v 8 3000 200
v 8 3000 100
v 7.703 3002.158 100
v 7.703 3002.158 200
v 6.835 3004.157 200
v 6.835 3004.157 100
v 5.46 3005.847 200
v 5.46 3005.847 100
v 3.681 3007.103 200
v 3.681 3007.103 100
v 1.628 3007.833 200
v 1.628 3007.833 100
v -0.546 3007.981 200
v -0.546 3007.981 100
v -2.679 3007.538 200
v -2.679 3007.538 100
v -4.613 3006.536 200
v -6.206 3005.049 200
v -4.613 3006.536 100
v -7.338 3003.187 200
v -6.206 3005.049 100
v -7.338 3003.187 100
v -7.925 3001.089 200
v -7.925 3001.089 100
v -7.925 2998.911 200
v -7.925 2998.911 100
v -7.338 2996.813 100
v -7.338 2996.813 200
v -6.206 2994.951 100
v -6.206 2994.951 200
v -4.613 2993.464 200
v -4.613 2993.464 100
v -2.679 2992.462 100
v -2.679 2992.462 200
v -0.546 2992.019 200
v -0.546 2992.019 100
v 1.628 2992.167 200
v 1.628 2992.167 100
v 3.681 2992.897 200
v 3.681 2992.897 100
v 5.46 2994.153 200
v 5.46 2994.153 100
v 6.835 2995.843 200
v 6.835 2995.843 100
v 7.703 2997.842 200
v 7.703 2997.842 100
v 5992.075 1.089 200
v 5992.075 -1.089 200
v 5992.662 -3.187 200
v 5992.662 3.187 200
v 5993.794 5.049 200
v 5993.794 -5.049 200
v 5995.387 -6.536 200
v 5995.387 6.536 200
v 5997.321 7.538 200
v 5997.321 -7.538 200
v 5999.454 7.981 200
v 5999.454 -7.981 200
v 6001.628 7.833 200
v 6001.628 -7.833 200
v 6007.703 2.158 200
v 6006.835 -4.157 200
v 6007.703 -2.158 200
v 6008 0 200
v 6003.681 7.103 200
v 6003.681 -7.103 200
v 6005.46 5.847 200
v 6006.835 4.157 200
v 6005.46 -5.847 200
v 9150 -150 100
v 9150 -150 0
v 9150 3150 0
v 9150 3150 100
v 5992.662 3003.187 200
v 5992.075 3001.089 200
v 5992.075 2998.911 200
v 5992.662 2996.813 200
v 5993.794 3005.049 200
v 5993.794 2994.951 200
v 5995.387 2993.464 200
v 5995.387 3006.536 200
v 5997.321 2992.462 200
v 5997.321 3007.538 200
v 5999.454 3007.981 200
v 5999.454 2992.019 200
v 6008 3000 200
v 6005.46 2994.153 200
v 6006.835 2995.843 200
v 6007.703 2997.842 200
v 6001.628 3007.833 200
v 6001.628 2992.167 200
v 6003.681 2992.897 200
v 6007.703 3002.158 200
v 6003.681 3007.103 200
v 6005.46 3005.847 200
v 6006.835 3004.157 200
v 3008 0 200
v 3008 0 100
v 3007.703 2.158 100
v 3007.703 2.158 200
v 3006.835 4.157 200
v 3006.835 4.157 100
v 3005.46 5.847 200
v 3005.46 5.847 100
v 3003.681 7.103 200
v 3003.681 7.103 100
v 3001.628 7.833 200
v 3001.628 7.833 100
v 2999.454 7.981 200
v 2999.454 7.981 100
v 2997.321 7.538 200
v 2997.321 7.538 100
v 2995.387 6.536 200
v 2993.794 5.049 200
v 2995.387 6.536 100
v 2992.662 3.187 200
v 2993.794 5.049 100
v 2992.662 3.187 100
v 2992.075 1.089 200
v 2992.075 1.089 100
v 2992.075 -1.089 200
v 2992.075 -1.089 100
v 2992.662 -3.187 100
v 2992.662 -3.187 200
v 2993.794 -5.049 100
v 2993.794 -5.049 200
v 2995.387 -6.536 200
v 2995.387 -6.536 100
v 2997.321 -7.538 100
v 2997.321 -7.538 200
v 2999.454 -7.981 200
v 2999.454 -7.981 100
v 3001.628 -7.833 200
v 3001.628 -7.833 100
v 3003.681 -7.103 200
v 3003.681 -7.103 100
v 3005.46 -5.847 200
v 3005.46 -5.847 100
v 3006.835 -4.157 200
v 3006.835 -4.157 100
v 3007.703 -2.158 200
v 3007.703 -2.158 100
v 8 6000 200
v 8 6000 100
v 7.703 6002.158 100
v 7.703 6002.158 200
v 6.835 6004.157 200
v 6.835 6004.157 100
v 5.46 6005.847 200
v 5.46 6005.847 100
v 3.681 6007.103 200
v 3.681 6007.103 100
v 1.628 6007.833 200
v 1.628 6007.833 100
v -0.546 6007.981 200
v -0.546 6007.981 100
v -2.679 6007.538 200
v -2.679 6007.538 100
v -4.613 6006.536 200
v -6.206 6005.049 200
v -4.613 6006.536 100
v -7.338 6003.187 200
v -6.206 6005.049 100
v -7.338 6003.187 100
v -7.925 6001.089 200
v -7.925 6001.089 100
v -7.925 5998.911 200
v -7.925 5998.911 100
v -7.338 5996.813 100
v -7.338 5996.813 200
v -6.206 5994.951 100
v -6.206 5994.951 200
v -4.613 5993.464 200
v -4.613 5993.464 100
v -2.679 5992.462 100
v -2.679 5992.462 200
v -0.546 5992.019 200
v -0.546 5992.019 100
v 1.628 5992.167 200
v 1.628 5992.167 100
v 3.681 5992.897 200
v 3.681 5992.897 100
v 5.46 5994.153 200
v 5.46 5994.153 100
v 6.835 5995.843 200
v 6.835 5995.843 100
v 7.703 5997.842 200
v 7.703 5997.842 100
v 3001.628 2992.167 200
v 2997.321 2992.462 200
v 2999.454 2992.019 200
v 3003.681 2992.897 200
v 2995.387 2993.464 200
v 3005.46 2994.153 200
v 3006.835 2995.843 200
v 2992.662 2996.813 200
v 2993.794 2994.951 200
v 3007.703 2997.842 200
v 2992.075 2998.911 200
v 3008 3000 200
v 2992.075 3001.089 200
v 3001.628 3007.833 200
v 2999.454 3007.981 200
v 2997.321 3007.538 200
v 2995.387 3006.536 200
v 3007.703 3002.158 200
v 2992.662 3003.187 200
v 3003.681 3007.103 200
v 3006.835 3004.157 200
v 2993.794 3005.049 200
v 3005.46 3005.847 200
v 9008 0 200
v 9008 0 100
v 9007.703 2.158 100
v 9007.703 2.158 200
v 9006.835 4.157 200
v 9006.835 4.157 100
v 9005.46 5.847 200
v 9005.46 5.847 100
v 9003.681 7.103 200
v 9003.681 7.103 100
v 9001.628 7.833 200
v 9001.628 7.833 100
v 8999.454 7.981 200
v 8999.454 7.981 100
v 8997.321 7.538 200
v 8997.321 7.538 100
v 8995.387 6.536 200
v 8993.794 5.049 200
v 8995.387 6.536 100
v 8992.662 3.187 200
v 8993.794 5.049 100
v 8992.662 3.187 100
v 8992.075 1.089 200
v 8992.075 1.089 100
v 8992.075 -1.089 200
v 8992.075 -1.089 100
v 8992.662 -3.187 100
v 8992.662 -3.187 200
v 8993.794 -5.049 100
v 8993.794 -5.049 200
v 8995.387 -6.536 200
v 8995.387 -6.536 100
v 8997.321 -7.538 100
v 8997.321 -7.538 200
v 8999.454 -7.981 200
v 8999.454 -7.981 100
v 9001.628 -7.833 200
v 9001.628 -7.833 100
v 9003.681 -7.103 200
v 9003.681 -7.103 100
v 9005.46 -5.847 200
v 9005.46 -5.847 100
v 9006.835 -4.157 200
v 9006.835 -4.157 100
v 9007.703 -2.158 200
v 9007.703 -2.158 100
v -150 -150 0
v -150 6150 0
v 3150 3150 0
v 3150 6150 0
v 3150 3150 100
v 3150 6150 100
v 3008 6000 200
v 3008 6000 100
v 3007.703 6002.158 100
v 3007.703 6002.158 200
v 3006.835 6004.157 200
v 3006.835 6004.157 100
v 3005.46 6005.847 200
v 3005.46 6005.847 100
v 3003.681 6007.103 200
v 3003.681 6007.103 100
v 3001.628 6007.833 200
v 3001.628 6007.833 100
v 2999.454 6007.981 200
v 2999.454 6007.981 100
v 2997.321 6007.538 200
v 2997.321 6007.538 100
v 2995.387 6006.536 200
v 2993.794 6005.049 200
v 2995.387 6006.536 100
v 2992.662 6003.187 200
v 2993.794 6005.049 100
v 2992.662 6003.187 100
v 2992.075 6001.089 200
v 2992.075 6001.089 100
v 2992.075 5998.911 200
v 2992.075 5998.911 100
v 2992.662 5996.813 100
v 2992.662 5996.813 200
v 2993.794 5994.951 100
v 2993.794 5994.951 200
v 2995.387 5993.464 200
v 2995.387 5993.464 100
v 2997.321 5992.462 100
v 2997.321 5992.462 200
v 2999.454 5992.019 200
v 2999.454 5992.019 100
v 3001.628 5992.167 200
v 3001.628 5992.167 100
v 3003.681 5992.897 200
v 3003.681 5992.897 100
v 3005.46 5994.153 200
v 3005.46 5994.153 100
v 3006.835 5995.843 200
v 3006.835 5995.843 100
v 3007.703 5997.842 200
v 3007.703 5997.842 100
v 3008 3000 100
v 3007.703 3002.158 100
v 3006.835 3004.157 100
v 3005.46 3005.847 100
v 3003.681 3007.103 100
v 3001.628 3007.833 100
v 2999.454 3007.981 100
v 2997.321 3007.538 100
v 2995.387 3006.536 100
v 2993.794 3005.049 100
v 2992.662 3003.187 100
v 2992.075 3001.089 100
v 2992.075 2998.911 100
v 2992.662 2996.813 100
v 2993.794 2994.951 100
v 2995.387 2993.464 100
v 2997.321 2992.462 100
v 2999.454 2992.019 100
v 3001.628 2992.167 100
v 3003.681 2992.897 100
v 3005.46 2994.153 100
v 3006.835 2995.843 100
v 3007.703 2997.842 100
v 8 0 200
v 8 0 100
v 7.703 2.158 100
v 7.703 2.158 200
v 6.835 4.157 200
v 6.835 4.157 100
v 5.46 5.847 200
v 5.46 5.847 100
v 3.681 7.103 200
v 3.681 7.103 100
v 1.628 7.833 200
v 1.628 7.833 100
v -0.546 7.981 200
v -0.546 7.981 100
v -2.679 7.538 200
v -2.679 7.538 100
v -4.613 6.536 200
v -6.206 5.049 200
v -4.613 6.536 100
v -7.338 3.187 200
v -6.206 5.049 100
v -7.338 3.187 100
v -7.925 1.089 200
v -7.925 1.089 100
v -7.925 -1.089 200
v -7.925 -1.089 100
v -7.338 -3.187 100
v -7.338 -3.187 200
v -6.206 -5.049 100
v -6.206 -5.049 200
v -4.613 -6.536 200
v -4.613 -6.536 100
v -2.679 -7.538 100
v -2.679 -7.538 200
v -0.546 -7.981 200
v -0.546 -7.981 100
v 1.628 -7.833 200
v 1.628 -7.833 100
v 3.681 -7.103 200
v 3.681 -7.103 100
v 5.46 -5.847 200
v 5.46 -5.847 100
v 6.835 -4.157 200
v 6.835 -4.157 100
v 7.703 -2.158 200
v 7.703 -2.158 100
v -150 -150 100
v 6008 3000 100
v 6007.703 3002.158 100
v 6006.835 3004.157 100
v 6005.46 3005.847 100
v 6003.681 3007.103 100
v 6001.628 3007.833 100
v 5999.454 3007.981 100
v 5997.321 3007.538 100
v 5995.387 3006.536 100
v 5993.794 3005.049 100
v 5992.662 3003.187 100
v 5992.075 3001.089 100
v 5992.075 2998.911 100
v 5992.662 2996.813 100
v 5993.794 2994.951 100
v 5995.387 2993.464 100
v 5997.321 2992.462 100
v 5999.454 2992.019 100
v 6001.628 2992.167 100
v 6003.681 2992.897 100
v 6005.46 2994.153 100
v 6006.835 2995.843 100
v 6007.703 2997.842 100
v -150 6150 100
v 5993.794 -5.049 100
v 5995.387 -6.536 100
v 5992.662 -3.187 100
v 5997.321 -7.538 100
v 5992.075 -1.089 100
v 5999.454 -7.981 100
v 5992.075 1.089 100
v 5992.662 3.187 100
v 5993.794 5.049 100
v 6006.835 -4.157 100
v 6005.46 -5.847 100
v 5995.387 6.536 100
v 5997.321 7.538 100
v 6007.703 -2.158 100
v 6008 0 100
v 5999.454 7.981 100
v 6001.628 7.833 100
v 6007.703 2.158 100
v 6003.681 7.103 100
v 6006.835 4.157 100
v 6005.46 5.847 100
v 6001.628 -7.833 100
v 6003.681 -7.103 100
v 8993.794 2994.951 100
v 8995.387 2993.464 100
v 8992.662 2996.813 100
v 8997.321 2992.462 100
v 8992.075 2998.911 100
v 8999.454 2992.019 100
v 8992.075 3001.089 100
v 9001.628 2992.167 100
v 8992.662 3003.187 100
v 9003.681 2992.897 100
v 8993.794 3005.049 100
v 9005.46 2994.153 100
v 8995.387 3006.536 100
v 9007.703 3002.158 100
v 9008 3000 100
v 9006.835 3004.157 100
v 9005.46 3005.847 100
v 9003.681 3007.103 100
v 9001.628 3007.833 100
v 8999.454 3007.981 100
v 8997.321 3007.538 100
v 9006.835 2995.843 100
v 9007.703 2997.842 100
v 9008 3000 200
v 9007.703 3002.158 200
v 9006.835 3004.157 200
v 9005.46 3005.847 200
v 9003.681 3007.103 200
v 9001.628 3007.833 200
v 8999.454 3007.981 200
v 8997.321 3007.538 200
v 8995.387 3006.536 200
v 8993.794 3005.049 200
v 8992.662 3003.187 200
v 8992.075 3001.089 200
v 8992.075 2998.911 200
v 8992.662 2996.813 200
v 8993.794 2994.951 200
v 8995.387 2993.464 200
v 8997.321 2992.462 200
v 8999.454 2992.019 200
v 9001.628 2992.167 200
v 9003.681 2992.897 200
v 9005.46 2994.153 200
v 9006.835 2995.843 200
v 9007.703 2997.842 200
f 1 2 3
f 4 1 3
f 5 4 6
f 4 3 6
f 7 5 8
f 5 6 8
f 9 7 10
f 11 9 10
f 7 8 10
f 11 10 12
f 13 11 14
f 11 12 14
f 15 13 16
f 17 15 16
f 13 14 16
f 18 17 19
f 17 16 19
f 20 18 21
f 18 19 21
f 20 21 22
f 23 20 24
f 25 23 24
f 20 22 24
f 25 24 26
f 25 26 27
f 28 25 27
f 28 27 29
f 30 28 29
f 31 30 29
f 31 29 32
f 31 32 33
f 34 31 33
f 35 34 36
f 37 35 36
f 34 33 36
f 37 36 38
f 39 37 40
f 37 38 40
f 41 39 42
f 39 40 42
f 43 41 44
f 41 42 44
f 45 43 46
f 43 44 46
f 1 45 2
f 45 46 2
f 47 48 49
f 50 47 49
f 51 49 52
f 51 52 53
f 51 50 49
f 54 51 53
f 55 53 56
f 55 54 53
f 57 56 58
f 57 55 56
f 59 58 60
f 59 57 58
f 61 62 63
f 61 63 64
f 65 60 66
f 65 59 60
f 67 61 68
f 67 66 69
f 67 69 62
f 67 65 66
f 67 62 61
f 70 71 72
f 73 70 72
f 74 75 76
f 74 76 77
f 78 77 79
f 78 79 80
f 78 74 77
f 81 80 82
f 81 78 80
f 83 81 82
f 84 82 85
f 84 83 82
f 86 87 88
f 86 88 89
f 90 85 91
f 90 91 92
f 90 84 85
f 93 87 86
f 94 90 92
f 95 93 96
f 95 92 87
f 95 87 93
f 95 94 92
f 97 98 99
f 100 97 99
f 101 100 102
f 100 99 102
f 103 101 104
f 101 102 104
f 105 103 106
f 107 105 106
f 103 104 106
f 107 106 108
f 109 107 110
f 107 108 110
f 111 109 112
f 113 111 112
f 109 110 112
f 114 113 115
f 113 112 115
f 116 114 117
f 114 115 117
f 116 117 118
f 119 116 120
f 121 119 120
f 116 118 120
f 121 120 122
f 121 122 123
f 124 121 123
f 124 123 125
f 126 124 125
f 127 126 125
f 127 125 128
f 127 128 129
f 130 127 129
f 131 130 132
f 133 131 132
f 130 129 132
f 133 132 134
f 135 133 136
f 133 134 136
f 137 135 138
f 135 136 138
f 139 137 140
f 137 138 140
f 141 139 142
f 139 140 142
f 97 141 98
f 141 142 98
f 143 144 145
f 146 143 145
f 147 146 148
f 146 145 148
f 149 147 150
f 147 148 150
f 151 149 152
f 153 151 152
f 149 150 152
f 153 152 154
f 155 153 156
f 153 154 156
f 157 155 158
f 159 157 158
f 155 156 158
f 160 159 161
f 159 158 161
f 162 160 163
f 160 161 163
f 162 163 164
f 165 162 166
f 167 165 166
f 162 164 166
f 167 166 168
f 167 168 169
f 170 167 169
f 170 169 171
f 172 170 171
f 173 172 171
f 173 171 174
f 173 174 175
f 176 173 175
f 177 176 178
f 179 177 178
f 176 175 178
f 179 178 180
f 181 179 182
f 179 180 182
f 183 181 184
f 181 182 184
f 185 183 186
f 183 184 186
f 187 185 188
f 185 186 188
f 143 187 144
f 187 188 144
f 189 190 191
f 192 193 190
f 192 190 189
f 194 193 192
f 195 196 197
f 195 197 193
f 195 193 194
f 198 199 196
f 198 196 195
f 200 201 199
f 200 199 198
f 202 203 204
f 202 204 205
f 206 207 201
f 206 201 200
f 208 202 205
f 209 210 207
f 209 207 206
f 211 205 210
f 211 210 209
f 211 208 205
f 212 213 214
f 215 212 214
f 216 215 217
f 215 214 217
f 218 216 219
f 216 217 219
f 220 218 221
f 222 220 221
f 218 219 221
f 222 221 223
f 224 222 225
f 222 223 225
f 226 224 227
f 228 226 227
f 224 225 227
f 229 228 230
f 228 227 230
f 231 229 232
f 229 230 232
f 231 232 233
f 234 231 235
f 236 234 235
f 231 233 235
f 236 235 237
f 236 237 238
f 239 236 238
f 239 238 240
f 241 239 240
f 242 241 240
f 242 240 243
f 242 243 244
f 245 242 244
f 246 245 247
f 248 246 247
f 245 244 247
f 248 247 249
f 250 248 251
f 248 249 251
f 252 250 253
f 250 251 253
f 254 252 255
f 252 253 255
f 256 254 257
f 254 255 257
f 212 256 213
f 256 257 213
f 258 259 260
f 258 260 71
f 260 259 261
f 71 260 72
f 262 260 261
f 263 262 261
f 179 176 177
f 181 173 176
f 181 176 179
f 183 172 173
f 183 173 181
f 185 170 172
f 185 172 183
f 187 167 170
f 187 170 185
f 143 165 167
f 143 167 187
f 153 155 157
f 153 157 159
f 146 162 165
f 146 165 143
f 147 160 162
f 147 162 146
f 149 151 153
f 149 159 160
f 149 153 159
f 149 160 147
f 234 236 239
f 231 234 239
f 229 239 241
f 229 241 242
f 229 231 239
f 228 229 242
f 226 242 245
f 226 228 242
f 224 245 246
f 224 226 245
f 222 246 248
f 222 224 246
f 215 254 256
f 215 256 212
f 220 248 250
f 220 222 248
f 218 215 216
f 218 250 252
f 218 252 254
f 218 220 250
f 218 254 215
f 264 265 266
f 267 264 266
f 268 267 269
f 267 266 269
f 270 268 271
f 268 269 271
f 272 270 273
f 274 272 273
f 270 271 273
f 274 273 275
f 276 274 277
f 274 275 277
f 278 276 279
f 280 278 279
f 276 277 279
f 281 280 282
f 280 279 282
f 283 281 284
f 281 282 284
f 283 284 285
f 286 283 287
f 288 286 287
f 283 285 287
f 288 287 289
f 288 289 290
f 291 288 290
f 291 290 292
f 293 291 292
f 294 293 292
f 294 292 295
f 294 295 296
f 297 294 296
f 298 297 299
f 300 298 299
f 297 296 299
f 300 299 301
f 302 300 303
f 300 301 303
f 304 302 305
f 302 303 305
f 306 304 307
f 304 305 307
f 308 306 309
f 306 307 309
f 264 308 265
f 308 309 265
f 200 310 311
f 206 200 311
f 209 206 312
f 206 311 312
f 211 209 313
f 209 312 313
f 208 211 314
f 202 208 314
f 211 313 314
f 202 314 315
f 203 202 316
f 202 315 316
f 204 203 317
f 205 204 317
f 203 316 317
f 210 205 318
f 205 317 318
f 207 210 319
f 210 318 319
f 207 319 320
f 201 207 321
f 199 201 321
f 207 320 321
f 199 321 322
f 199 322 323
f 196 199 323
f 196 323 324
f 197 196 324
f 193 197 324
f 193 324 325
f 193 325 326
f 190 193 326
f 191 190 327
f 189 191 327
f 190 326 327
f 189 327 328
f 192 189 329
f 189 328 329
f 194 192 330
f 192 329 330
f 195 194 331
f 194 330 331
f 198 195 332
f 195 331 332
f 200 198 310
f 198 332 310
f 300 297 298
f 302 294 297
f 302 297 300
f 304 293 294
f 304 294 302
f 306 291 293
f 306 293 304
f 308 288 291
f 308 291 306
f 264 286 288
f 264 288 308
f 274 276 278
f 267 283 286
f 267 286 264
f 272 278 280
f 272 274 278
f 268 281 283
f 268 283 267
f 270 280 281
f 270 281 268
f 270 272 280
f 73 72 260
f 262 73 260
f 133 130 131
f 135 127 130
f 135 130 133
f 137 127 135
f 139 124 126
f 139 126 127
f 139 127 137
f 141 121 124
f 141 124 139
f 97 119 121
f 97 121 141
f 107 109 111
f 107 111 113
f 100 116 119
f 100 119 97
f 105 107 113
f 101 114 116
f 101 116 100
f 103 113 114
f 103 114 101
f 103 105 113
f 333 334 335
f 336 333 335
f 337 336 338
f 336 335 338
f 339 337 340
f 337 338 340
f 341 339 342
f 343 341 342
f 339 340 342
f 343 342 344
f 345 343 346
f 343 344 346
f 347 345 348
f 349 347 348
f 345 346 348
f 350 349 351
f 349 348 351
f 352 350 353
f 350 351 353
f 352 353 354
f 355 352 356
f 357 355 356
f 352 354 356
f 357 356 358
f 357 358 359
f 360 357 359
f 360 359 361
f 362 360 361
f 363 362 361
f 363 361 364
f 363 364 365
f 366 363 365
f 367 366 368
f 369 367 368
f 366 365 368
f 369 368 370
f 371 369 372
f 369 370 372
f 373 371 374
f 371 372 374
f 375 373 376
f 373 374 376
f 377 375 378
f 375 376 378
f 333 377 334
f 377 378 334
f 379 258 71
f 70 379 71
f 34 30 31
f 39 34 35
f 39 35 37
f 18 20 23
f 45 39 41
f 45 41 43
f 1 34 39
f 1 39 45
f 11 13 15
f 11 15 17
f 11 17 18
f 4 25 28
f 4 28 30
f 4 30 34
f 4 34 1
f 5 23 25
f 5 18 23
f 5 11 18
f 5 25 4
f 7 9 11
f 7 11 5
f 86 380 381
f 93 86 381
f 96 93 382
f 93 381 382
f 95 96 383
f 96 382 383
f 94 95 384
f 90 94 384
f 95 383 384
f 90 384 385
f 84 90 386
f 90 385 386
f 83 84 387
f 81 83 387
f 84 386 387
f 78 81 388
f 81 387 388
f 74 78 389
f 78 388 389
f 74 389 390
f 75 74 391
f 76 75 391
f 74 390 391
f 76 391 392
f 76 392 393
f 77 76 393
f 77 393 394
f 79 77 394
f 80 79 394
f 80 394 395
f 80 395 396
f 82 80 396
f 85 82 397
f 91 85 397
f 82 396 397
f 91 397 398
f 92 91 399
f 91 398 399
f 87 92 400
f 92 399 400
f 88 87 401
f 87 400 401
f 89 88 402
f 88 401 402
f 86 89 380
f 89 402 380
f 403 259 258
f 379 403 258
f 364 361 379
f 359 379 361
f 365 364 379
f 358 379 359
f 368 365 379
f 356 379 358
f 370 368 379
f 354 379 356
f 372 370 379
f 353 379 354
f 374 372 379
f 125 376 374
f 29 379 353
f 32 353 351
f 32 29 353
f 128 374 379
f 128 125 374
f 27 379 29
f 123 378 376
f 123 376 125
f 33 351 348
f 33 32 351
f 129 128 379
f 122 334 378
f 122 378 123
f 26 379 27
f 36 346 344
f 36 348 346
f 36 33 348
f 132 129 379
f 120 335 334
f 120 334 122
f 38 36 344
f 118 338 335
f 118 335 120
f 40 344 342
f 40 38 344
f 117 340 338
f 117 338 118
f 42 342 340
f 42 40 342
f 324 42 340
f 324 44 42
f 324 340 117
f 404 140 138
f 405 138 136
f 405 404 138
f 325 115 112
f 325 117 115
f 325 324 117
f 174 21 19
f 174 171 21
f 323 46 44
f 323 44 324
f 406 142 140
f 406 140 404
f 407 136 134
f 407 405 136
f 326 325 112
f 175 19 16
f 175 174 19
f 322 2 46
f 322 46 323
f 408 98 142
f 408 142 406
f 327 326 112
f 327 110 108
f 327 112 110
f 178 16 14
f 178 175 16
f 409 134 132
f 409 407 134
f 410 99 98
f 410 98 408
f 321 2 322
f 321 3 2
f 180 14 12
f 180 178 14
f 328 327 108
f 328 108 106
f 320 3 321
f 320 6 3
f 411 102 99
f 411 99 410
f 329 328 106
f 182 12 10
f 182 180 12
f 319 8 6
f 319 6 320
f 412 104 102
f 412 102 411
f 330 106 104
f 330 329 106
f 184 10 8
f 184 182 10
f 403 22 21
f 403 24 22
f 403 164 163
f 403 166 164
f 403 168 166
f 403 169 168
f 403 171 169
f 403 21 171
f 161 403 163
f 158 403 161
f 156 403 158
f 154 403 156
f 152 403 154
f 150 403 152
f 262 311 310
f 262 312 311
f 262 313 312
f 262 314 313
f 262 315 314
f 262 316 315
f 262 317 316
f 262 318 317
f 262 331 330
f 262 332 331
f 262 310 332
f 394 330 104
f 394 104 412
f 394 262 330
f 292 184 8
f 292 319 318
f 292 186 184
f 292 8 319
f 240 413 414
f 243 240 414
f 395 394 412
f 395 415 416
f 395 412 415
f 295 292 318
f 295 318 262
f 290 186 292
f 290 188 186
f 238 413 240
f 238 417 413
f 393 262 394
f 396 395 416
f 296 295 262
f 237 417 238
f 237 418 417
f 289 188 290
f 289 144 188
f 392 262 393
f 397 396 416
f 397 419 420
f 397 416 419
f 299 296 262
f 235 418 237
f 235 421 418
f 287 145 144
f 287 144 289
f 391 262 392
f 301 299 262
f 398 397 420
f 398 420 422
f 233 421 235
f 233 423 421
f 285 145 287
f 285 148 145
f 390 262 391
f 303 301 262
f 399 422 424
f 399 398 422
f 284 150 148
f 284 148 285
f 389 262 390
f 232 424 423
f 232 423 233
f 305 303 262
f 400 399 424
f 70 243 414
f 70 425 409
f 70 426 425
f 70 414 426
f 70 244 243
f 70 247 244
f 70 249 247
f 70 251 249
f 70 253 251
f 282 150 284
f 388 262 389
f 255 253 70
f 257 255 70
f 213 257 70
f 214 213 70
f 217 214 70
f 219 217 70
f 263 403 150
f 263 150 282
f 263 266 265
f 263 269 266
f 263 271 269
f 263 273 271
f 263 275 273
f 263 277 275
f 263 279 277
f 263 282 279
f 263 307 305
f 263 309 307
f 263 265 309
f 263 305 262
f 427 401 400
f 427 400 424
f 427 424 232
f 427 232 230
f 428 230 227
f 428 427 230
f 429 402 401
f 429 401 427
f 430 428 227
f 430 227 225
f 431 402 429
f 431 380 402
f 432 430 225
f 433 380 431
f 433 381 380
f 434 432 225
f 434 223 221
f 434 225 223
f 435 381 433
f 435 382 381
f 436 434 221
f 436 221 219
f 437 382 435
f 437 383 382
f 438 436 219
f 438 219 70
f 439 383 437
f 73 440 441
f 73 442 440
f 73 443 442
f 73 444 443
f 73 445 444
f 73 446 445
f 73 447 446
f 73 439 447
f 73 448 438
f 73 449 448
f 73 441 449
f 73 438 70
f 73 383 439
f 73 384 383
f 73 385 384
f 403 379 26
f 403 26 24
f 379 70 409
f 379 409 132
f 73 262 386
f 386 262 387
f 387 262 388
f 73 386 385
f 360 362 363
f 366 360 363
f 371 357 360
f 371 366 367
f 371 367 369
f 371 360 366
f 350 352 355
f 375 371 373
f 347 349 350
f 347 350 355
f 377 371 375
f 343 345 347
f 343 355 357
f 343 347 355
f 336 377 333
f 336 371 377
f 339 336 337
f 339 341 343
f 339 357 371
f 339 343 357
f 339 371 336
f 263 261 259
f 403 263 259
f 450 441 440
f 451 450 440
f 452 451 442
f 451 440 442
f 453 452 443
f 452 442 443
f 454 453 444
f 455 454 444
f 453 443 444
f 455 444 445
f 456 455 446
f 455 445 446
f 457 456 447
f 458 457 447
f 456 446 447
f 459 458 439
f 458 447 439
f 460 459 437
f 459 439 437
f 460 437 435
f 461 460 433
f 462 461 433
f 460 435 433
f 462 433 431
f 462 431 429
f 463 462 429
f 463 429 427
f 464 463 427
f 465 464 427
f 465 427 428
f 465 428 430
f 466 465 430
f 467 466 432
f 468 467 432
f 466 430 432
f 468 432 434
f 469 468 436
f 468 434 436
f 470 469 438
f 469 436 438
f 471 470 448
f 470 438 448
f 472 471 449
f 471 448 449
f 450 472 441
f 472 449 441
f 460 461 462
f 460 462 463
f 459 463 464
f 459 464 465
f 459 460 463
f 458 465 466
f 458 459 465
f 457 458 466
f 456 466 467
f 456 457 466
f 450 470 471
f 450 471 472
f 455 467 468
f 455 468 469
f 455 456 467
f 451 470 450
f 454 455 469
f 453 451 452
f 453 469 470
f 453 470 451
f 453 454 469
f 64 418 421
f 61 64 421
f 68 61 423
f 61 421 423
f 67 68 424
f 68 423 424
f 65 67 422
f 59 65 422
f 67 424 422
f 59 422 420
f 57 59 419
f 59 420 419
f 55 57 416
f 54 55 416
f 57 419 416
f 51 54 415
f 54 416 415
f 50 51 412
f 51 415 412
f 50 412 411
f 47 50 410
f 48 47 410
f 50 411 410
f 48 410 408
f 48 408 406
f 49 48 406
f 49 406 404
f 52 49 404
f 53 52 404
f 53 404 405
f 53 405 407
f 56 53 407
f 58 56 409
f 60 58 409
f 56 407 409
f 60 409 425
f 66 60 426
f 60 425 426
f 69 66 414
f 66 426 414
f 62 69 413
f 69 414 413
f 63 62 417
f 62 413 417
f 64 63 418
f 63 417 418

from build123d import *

# Parameters (mm, degrees)
F1_DEPTH = 100
F2_R     = 8
F3_DEPTH = 100


with BuildPart() as f1:
    # F0 (on Top) → F1 (new body)
    with BuildSketch(Plane.XY):
        Polygon((-150, 6150), (-150, -150), (9150, -150), (9150, 3150), (3150, 3150), (3150, 6150), align=None)
    extrude(amount=F1_DEPTH)

    # F2 (on face) → F3 (join)
    with BuildSketch(Plane.XY.offset(100)):
        with Locations((9000, 0)):
            Circle(F2_R)
        with Locations((9000, 3000)):
            Circle(F2_R)
        with Locations((6000, 0)):
            Circle(F2_R)
        with Locations((6000, 3000)):
            Circle(F2_R)
        with Locations((3000, 0)):
            Circle(F2_R)
        with Locations((3000, 3000)):
            Circle(F2_R)
        Circle(F2_R)
        with Locations((0, 3000)):
            Circle(F2_R)
        with Locations((3000, 6000)):
            Circle(F2_R)
        with Locations((0, 6000)):
            Circle(F2_R)
    extrude(amount=F3_DEPTH)


solid = f1.part
